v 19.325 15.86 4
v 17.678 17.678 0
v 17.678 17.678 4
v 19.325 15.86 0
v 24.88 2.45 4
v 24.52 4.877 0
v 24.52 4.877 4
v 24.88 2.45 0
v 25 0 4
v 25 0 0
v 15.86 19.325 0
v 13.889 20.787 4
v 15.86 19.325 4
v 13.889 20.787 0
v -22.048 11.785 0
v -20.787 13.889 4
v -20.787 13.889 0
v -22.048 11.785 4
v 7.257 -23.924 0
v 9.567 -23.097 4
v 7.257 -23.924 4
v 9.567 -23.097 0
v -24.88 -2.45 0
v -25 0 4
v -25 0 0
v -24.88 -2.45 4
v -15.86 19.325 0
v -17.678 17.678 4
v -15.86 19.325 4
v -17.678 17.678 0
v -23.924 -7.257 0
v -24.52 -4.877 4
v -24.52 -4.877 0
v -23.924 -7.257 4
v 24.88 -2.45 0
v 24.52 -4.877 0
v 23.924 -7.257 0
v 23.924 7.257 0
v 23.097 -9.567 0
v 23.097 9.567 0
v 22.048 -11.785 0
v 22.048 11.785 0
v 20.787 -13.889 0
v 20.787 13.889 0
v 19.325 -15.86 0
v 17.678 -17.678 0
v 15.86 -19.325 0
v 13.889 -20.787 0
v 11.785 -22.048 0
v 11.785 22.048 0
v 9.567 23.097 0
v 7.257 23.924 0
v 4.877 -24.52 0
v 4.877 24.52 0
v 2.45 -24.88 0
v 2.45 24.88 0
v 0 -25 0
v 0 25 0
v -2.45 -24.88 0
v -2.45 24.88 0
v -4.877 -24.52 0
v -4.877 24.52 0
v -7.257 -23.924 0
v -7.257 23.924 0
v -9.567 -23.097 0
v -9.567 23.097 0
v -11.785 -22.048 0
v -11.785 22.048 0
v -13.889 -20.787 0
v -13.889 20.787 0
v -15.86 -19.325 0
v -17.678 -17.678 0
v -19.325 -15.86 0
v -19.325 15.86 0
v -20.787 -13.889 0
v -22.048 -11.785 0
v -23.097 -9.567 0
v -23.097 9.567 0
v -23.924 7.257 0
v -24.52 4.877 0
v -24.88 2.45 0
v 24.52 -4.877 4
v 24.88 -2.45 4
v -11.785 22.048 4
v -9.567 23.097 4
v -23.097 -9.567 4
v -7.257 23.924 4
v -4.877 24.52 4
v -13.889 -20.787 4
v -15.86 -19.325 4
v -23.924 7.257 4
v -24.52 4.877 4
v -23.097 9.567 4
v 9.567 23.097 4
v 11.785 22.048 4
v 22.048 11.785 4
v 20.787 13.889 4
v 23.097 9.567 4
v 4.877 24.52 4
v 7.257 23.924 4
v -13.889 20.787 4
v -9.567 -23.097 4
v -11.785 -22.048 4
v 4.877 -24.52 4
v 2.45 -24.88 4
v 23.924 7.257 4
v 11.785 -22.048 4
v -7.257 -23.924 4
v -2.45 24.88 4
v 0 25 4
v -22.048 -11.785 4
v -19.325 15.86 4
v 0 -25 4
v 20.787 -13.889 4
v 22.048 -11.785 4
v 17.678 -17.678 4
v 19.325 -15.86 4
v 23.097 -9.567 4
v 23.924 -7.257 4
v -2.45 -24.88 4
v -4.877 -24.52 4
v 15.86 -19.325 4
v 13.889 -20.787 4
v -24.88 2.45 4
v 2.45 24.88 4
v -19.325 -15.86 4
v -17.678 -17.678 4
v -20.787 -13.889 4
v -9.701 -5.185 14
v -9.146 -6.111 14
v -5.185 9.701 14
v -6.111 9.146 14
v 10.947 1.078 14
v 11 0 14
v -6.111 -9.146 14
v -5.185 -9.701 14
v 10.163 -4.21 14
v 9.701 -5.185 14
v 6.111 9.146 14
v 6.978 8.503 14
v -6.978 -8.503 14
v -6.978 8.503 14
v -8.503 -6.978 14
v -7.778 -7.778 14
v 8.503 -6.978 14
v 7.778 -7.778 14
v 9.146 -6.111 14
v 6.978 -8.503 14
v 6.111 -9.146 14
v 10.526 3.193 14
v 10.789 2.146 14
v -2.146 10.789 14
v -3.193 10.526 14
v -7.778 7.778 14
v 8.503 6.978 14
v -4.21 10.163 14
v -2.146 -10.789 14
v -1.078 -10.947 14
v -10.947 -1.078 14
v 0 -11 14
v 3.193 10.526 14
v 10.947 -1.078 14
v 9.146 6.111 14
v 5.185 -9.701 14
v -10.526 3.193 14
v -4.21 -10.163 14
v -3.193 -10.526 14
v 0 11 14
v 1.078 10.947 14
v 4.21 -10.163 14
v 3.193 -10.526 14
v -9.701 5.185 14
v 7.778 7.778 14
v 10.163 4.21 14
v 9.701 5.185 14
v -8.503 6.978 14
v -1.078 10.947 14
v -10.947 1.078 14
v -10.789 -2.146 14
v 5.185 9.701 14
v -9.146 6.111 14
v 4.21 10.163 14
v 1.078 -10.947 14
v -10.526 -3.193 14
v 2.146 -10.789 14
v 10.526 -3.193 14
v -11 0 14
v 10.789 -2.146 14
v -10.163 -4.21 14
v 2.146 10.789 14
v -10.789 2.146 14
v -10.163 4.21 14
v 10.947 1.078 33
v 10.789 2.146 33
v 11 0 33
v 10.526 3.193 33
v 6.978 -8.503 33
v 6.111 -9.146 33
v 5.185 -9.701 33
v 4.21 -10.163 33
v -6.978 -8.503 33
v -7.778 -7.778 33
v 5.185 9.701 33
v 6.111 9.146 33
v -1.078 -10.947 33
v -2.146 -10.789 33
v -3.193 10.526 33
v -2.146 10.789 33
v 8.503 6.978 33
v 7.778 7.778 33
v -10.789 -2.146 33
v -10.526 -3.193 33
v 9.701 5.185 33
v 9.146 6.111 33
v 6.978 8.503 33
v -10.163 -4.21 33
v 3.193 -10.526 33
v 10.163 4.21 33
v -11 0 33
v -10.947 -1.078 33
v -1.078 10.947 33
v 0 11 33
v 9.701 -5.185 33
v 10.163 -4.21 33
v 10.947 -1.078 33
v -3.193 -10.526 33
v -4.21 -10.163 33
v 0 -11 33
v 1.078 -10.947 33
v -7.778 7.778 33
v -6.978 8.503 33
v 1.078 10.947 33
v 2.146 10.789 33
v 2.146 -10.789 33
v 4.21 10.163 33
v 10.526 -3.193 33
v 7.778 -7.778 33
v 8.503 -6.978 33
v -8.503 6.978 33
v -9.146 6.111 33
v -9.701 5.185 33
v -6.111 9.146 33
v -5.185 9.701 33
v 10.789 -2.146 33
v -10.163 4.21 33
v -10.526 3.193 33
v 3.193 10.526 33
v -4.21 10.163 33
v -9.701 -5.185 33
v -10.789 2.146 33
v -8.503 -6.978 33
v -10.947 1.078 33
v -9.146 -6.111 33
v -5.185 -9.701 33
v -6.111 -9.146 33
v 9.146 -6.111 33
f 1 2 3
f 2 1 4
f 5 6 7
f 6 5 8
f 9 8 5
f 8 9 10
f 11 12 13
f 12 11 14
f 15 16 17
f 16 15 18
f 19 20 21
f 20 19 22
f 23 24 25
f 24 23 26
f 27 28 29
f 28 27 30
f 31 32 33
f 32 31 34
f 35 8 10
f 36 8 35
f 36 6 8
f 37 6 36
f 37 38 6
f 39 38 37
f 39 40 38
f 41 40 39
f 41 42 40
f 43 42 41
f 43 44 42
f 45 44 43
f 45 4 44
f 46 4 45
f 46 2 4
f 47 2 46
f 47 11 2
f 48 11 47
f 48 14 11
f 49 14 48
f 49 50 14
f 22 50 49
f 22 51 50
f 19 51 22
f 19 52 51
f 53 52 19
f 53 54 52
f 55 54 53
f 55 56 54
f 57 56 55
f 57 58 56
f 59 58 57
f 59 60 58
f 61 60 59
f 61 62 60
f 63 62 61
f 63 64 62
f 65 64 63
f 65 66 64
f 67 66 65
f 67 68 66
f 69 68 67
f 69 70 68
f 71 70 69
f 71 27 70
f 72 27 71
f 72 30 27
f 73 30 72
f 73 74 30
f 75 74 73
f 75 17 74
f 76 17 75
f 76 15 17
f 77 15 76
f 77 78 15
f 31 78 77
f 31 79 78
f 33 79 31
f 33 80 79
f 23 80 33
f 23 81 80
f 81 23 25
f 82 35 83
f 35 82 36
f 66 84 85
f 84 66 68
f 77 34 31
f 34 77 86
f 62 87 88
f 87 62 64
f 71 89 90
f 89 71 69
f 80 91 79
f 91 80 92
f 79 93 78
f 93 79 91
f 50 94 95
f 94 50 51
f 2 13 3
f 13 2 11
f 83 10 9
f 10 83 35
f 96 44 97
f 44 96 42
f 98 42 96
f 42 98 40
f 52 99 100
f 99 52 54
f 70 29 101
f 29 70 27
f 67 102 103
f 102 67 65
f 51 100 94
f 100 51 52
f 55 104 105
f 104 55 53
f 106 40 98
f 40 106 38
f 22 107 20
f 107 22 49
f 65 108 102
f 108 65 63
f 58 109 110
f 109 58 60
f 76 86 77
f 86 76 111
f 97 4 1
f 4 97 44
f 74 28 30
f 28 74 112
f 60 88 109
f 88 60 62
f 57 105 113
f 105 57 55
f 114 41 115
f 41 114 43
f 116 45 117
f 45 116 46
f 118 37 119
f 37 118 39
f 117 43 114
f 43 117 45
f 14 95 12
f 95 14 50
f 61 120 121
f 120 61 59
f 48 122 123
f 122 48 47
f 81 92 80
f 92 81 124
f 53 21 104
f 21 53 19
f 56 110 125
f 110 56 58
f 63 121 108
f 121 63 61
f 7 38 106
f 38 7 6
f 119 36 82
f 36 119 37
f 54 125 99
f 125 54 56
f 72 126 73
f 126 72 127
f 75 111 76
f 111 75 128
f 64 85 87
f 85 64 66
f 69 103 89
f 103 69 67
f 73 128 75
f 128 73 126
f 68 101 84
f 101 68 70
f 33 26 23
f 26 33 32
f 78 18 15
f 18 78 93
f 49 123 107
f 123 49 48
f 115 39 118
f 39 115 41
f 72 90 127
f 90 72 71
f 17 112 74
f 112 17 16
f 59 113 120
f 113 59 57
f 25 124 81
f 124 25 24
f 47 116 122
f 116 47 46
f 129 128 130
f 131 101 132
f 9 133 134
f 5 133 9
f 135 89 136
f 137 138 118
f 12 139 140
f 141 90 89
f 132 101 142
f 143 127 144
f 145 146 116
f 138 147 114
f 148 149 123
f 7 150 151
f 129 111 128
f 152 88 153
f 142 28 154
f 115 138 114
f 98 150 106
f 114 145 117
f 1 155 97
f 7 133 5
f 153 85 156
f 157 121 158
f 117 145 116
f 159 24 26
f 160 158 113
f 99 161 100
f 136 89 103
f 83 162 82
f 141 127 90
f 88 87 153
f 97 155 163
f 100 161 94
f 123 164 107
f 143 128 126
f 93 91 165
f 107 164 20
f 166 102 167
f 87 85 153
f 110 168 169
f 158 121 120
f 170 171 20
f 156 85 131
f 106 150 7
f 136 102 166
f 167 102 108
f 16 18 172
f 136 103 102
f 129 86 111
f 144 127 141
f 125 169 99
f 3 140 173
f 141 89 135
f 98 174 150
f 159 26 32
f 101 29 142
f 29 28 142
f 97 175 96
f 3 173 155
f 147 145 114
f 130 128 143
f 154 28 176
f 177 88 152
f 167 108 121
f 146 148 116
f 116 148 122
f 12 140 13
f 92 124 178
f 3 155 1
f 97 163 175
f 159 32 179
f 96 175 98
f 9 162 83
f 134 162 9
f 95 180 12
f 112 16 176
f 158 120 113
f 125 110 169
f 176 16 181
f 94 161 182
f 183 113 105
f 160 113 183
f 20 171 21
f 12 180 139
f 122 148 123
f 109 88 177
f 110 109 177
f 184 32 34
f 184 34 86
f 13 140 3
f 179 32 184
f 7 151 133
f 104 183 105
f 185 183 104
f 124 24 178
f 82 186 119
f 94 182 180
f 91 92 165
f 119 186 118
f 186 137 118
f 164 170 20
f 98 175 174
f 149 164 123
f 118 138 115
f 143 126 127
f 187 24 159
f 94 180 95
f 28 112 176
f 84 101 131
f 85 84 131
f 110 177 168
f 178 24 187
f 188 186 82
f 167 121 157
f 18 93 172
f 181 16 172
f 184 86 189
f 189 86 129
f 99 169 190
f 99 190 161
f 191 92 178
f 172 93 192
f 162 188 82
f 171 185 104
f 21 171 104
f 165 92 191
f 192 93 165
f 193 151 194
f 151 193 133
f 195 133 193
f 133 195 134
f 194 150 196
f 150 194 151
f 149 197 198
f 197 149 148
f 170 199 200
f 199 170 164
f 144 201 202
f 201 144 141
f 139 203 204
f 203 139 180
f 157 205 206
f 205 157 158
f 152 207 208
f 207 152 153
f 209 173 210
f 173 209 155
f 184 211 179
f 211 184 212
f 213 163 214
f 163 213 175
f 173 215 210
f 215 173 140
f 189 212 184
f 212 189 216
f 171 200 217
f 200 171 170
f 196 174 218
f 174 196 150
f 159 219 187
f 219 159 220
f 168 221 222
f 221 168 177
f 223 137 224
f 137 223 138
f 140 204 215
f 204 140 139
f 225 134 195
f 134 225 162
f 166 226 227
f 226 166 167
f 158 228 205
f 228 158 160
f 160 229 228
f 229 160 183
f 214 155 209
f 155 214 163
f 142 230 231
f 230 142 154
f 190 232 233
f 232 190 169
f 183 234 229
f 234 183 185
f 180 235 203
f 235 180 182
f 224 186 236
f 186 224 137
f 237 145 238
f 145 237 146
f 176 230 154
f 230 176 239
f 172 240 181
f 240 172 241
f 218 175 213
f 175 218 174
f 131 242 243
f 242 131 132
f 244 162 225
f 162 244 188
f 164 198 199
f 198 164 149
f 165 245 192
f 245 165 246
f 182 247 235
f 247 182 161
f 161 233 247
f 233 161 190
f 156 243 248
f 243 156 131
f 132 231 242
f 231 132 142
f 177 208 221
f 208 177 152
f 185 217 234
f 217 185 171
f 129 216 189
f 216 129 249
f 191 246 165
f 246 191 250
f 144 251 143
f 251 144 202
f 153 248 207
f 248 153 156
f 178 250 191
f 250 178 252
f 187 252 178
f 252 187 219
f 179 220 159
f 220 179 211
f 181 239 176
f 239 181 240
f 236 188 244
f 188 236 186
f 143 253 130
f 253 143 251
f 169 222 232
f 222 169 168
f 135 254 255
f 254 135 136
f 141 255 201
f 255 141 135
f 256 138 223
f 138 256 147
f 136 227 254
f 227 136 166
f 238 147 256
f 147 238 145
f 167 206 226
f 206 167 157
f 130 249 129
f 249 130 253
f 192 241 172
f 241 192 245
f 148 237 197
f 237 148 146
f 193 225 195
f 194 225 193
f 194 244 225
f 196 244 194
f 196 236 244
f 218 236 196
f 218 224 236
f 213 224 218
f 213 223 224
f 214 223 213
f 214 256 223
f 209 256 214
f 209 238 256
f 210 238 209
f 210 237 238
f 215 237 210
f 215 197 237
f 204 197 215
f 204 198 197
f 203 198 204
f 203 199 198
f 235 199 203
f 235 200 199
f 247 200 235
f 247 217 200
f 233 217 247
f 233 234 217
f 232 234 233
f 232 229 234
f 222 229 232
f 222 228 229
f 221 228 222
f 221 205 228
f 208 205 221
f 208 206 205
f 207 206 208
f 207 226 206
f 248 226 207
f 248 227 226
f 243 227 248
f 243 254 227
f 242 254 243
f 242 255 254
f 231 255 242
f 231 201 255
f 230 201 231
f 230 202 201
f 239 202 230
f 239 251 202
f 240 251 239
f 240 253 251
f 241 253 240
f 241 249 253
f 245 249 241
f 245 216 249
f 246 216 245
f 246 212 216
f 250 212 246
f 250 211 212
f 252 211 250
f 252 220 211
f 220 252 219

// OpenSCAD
// --- Dimensions ---
base_diameter = 50.0;       // Diameter of the base disc
base_height = 4.0;          // Height of the base disc
cone_bottom_dia = 50.0;     // Diameter at the bottom of the cone (z=4)
cone_top_dia = 22.0;        // Diameter at the top of the cone (z=14)
cone_height = 10.0;         // Height of the cone section (14 - 4)
column_diameter = 22.0;      // Diameter of the top column
column_height = 19.0;        // Height of the column (33 - 14)
total_height = 33.0;        // Total height of the object

// Tube Seat Dimensions
seat_top_dia = 11.0;        // Diameter of the cylindrical part of the seat
seat_top_z = 33.0;          // Z-coordinate at the top of the seat
seat_mid_z = 23.0;          // Z-coordinate where seat transitions to cone
seat_mid_dia = 11.0;        // Diameter at the transition point
seat_bottom_dia = 3.0;      // Diameter at the tip of the seat cone
seat_bottom_z = 6.0;        // Z-coordinate at the tip of the seat cone

// Viewing Window Dimensions
window_width_y = 4.0;       // Width of the window in Y direction
window_height_start = 18.0; // Z-coordinate where window starts
window_height_end = 30.0;   // Z-coordinate where window ends
window_offset_x = 0.01;     // Small offset to ensure clean cut

// --- Parameters ---
$fn = 64;

// --- Main Construction ---

union() {
    // 1. The Base Disc
    cylinder(d = base_diameter, h = base_height);

    // 2. The Cone Section
    translate([0, 0, base_height])
    cylinder(d1 = cone_bottom_dia, d2 = cone_top_dia, h = cone_height);

    // 3. The Top Column
    translate([0, 0, base_height + cone_height])
    cylinder(d = column_diameter, h = column_height);
}

// --- Subtraction (The Tube Seat and Window) ---

difference() {
    // We use a dummy object to perform the subtraction from the union above
    // However, in OpenSCAD it is cleaner to wrap the whole thing in a difference
    // Let's restructure the logic for a single difference block.
}

// RESTRUCTURED FOR CLEAN DIFFERENCE
// (The above was conceptual, here is the actual single-block logic)

// Note: To follow the rules strictly, I will rewrite the whole thing 
// inside one difference() block to ensure the cuts are clean.

/* 
REWRITTEN STRUCTURE:
*/

difference() {
    // THE SOLID BODY
    union() {
        // Base
        cylinder(d = base_diameter, h = base_height);
        // Cone
        translate([0, 0, base_height])
        cylinder(d1 = cone_bottom_dia, d2 = cone_top_dia, h = cone_height);
        // Column
        translate([0, 0, base_height + cone_height])
        cylinder(d = column_diameter, h = column_height);
    }

    // THE TUBE SEAT (Subtracted)
    // Part 1: Cylindrical seat
    translate([0, 0, seat_mid_z])
    cylinder(d = seat_top_dia, h = seat_top_z - seat_mid_z + 1);
    
    // Part 2: Conical seat
    translate([0, 0, seat_bottom_z])
    cylinder(d1 = seat_bottom_dia, d2 = seat_mid_dia, h = seat_mid_z - seat_bottom_z + 1);

    // THE VIEWING WINDOW (Subtracted)
    // The window is cut through the column wall on the +X side.
    // It is 4mm wide in Y, meaning it spans from Y = -2 to Y = 2.
    // It is cut "straight through the column wall on the +X side".
    // This implies a rectangular prism cut.
    
    translate([column_diameter/2 - 1, -window_width_y/2, window_height_start])
    cube([column_diameter, window_width_y, window_height_end - window_height_start + 1]);
    
    // To ensure the window cuts through the whole side, we extend the cube 
    // from the center to the edge.
    translate([0, -window_width_y/2, window_height_start])
    cube([column_diameter/2 + 2, window_width_y, window_height_end - window_height_start + 1]);

}

// Final cleanup: The logic above is slightly redundant in the window. 
// Let's provide the optimized, single-block version below.
